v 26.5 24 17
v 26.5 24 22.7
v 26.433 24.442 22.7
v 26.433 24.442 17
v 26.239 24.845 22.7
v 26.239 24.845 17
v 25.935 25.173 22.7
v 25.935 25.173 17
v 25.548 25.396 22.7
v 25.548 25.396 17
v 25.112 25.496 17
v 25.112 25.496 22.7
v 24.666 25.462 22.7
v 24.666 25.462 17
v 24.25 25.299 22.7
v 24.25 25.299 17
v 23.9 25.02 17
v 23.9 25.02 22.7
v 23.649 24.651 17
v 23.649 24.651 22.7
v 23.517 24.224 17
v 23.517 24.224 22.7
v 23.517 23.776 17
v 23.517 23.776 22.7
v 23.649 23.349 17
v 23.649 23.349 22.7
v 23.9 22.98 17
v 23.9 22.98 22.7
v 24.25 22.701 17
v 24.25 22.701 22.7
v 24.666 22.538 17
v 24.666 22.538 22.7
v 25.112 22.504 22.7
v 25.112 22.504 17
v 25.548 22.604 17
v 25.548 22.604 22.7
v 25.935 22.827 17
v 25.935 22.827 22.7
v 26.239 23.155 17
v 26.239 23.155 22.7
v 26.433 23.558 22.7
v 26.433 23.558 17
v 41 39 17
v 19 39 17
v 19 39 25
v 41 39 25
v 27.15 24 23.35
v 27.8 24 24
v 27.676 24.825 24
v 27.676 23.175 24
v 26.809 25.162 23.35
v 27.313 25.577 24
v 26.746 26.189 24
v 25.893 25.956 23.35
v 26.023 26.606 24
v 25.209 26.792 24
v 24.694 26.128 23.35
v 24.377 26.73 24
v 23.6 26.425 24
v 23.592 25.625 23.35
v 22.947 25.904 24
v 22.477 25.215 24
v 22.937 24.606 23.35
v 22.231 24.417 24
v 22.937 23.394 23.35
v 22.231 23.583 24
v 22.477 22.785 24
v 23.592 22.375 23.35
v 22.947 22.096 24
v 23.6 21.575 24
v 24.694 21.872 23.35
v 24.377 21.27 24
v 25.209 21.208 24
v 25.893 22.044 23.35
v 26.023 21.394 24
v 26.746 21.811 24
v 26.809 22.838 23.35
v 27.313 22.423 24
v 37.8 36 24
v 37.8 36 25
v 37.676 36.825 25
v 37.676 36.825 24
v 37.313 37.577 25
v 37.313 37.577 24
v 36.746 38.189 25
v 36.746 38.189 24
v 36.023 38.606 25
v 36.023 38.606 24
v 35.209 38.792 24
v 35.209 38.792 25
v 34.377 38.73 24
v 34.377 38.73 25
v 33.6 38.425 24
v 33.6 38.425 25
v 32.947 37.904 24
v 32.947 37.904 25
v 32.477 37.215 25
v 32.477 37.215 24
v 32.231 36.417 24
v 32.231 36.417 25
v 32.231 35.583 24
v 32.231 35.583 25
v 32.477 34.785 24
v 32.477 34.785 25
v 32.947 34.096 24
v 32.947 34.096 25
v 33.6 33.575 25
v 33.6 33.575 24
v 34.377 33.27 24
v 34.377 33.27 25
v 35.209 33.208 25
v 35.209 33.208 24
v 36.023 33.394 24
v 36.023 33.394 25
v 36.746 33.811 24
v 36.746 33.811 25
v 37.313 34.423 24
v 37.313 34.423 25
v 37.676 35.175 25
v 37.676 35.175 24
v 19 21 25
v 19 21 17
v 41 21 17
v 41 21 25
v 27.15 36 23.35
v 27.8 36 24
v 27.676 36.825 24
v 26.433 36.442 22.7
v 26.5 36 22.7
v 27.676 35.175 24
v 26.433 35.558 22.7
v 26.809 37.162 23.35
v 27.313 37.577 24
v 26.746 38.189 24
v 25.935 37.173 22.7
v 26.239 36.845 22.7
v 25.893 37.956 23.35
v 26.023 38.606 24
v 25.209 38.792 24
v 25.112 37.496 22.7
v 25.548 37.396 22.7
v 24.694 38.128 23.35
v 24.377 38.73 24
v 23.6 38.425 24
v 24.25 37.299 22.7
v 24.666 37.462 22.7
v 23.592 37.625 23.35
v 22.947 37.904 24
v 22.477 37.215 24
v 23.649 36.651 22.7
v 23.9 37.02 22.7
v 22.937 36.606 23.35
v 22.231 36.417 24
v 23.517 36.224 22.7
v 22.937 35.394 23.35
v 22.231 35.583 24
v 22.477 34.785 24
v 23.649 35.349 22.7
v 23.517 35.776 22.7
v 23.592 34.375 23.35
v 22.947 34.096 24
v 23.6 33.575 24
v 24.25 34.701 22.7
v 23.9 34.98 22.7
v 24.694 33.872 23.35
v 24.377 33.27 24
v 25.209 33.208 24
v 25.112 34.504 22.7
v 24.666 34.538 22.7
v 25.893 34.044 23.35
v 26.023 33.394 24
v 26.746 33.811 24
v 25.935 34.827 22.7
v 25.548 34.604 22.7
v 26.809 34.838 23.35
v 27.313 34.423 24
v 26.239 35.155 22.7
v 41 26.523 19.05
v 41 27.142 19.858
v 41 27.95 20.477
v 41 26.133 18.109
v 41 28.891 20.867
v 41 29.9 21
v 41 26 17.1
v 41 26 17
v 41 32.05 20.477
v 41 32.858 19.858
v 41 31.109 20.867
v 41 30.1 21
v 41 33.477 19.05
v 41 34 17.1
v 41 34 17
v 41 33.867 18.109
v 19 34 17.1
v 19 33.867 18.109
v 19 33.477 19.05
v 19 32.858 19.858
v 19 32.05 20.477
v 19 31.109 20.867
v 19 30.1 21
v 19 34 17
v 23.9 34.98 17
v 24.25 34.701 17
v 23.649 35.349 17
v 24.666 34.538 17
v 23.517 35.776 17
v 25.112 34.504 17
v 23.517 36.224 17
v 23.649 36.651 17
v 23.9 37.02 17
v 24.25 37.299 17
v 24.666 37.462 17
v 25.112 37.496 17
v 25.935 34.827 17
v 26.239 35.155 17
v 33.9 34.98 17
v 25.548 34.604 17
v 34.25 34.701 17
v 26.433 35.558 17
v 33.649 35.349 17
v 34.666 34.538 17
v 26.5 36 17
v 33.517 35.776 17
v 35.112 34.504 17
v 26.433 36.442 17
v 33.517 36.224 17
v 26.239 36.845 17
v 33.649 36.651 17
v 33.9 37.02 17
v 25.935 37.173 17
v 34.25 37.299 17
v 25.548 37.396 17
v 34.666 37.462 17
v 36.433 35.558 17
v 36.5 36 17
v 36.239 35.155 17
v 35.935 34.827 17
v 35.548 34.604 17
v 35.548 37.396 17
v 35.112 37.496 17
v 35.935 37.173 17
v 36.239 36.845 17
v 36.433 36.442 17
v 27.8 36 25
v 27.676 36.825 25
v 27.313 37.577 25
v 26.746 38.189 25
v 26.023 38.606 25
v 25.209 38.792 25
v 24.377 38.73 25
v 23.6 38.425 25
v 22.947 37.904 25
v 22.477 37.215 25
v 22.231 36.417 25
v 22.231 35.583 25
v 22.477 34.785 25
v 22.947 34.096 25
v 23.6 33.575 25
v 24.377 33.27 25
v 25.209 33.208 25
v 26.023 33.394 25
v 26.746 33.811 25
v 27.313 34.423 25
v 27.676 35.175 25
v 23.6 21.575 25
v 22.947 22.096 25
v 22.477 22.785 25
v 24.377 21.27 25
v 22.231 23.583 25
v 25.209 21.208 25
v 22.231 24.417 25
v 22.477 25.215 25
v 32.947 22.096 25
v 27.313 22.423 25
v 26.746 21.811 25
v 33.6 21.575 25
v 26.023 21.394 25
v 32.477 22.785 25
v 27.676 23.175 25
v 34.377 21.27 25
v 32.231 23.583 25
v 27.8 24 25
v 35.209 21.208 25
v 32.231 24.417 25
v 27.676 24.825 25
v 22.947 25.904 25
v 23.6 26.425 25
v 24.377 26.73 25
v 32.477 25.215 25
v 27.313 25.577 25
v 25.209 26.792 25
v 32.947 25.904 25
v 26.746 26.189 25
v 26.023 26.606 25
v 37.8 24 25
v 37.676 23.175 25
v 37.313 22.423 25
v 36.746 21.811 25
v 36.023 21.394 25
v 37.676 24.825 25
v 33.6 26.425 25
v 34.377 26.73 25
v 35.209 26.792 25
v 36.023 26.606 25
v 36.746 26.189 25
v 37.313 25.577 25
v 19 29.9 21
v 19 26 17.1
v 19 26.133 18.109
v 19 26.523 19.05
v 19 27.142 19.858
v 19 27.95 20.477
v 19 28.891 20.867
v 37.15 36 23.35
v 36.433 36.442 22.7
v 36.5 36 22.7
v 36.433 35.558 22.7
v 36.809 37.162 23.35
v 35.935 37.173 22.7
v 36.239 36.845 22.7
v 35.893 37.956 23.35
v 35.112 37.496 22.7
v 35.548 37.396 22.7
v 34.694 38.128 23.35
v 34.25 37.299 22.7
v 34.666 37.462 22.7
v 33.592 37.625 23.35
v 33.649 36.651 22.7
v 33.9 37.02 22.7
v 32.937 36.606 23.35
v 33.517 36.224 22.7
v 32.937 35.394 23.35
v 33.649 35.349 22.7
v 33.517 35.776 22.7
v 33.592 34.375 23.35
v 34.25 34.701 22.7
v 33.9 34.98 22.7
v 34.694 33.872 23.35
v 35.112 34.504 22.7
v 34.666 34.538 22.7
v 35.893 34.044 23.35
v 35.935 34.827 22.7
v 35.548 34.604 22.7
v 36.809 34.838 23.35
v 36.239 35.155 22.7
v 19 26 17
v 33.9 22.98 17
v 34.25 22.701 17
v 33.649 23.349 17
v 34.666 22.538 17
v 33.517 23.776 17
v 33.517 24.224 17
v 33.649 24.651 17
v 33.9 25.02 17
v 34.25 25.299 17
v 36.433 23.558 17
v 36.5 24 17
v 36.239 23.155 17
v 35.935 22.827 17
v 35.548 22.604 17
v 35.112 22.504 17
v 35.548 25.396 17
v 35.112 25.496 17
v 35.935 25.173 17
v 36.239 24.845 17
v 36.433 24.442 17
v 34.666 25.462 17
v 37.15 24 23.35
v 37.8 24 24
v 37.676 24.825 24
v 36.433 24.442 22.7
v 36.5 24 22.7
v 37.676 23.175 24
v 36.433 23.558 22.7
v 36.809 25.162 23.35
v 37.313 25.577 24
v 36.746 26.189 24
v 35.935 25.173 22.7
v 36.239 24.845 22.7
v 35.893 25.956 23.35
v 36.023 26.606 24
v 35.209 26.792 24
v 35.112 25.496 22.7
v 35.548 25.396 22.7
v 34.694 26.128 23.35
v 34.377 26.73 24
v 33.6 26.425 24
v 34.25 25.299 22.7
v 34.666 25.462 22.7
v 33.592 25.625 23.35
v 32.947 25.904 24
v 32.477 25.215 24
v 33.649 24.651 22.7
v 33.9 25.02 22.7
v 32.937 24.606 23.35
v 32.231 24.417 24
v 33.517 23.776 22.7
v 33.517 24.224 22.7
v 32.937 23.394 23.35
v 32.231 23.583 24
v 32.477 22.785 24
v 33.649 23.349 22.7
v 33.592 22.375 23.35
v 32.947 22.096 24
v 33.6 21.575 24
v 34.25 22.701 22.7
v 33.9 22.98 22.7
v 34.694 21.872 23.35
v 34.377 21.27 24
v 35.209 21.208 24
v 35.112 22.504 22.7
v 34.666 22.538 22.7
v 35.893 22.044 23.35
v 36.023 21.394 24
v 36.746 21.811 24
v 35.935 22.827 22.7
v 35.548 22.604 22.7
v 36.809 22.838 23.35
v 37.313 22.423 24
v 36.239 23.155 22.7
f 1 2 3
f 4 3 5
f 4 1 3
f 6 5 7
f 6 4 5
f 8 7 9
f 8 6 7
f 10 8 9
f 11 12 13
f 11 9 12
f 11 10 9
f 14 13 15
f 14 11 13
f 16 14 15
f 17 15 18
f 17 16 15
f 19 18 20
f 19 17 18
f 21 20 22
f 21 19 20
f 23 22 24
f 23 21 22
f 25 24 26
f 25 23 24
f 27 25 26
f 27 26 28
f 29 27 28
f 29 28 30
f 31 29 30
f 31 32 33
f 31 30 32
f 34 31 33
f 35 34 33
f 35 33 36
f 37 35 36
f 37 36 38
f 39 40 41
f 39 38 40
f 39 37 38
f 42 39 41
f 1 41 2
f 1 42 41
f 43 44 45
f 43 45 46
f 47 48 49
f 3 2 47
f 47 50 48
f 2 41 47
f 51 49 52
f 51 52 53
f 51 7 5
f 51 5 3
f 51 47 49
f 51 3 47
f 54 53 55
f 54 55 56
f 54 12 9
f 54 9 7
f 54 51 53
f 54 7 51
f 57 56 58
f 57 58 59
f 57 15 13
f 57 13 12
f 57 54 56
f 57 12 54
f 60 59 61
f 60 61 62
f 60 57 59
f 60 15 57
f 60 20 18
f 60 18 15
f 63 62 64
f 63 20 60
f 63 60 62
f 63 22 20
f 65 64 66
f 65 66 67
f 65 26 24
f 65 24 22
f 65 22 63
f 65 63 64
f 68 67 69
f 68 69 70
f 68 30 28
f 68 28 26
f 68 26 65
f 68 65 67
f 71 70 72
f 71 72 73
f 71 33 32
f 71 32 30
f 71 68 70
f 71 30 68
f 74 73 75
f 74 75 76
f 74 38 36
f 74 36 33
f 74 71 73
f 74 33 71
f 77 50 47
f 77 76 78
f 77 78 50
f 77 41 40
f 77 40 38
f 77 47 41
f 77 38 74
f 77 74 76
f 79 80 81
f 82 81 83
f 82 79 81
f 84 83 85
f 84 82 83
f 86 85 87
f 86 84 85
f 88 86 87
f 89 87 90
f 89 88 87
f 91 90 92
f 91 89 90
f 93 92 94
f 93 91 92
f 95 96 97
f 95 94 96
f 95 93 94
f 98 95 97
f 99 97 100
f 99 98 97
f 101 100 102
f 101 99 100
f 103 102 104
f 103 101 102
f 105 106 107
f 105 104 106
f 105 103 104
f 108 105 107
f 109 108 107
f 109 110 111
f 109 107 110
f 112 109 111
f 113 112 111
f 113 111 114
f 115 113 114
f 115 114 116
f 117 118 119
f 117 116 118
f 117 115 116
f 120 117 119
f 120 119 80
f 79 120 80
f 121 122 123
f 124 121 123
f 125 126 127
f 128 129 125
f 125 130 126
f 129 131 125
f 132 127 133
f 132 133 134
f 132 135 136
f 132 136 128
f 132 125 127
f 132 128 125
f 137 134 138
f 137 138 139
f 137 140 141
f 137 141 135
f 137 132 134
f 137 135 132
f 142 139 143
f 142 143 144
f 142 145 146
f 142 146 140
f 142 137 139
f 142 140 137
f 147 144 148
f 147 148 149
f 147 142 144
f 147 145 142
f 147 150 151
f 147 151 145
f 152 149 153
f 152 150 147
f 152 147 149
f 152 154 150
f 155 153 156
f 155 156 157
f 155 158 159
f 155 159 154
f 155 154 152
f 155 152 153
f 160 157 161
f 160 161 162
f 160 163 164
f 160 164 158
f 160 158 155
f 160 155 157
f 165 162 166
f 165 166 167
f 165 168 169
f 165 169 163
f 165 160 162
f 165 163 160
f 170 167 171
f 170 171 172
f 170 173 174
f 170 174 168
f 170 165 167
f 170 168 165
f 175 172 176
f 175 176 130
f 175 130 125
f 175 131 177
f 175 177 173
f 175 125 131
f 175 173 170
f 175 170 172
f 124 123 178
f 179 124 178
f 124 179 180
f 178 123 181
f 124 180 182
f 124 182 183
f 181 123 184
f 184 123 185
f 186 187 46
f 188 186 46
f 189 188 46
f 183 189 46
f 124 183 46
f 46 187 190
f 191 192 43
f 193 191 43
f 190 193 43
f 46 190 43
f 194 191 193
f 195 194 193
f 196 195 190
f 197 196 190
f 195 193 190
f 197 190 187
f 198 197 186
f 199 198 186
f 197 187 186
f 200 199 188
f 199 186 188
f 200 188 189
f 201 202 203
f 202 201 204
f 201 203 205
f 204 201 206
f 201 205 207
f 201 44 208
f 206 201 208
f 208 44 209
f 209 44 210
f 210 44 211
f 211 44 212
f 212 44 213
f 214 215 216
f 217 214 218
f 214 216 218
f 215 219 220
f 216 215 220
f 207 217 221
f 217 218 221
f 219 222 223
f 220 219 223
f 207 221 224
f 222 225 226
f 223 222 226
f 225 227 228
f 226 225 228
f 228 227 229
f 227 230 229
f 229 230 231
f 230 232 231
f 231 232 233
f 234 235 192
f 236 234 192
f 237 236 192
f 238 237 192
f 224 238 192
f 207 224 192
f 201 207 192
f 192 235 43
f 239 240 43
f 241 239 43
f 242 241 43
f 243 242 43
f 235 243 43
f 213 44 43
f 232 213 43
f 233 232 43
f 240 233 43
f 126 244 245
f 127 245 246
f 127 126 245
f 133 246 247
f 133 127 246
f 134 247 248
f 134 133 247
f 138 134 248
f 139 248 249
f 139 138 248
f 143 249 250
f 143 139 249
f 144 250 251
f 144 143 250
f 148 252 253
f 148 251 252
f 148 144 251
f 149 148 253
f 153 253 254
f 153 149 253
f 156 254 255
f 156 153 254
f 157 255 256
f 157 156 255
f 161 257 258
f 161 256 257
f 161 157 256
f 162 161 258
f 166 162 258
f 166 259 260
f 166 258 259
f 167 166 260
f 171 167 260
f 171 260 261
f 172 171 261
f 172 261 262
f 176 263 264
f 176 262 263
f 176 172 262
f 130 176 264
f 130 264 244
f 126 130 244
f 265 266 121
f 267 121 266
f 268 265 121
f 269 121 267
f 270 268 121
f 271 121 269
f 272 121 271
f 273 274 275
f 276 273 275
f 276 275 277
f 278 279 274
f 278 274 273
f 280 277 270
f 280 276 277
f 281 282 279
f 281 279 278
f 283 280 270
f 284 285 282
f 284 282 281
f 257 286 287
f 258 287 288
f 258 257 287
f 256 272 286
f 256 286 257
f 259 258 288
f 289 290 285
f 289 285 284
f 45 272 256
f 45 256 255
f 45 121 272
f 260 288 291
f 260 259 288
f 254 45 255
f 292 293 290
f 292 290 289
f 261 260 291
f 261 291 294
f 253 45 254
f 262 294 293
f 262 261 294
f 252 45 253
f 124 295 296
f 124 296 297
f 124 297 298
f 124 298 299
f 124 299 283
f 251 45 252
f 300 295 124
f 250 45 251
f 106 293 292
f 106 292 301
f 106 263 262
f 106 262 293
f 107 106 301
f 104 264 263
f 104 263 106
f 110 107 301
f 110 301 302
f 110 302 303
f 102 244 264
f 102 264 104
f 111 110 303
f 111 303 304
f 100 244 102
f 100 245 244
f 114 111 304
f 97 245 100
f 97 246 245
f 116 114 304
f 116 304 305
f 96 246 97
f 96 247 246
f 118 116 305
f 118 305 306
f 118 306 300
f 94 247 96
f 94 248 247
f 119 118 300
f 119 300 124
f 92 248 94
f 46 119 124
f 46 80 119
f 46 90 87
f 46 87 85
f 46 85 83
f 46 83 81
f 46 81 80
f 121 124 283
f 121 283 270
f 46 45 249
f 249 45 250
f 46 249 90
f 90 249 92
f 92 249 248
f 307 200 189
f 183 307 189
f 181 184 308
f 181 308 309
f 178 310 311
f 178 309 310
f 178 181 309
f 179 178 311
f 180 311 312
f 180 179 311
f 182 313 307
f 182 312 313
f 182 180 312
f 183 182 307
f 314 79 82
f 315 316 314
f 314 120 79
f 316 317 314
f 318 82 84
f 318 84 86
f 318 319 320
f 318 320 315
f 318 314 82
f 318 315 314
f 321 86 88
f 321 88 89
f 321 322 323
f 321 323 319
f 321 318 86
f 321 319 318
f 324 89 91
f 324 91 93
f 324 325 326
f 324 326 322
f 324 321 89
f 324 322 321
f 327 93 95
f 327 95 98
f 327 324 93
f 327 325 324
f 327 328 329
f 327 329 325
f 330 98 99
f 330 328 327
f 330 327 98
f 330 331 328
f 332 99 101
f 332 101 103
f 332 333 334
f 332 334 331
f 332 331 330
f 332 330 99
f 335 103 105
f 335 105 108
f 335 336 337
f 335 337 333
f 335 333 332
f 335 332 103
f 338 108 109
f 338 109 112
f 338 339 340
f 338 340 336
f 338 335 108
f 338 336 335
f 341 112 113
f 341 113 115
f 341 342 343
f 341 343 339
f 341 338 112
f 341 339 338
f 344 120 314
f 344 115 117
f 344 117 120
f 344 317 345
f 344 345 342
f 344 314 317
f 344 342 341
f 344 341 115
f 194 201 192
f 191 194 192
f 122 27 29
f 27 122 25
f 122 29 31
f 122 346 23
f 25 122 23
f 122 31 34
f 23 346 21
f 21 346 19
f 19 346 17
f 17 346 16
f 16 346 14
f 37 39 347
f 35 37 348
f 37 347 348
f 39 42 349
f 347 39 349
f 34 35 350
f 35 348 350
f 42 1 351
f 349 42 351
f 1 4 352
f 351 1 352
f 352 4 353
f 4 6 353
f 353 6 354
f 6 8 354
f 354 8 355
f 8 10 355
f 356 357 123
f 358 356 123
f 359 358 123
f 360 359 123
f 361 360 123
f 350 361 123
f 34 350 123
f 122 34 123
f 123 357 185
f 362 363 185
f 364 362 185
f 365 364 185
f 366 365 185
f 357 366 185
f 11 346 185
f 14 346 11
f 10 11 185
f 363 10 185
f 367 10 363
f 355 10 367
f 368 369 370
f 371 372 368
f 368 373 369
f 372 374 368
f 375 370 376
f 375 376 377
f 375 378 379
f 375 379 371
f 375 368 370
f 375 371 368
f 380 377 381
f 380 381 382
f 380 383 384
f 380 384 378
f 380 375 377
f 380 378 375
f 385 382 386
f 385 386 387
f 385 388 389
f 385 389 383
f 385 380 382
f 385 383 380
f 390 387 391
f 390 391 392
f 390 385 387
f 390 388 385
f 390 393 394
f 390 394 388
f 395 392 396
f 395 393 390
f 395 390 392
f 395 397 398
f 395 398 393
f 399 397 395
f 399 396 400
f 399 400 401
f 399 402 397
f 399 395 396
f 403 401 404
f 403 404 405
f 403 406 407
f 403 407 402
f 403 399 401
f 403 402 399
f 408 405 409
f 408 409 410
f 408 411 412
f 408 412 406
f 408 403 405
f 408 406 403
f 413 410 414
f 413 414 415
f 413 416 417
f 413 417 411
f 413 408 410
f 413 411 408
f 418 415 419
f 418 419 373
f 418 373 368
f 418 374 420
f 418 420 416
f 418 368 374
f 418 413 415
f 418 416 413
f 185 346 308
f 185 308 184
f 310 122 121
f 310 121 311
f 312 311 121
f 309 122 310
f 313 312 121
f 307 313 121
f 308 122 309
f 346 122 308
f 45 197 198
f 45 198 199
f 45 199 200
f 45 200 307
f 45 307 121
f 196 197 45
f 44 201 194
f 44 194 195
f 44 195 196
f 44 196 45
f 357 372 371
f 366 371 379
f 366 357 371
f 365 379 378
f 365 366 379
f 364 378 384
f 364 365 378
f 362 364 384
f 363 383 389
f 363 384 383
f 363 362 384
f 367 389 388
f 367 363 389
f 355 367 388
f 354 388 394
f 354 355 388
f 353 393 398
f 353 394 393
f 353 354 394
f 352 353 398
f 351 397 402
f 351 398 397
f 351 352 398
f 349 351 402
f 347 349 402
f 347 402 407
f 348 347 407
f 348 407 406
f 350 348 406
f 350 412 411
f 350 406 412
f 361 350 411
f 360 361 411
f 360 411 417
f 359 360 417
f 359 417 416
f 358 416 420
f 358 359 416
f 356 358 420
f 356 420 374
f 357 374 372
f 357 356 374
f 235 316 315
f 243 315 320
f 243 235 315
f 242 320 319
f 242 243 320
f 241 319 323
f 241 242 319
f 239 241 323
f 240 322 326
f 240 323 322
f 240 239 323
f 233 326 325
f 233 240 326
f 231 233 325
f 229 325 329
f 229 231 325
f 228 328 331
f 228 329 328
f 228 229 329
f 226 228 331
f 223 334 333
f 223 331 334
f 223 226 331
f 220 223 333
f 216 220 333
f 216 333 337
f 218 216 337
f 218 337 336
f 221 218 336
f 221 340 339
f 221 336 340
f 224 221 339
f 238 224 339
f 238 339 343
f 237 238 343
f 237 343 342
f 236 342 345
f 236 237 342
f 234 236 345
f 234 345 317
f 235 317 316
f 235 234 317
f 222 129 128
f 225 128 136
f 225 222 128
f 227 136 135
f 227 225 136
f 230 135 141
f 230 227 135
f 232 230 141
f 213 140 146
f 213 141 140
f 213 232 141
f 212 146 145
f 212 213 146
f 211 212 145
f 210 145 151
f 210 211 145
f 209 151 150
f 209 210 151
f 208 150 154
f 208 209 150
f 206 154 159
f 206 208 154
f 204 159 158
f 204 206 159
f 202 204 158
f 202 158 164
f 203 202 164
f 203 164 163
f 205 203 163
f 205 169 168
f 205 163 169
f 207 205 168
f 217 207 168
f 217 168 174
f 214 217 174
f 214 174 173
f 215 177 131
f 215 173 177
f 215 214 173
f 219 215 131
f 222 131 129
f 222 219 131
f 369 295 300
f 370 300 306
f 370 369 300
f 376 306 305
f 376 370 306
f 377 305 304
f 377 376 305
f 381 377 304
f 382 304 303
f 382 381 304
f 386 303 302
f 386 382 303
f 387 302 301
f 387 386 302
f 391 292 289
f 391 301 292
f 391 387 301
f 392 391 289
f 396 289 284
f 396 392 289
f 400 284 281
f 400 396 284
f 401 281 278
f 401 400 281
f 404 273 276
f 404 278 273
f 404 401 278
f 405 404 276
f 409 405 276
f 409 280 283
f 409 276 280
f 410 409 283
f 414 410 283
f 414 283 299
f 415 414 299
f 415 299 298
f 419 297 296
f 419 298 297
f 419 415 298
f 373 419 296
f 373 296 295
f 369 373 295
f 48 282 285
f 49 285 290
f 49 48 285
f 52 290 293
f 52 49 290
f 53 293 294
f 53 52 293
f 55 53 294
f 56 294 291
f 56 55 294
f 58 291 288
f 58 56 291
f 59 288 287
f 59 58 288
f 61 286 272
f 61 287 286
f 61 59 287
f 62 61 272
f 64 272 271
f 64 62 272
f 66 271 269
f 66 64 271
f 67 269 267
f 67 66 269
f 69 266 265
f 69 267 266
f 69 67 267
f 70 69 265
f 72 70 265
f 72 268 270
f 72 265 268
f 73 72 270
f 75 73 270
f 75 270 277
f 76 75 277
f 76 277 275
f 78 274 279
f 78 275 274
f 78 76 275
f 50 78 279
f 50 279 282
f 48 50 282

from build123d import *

# Parameters (mm, degrees)
CYLINDER018_R     = 1.5
CYLINDER018_DEPTH = 25
CYLINDER020_R     = 2.8
CYLINDER020_DEPTH = 5
CHAMFER001_SIZE   = 2
CYLINDER016_R     = 1.5
CYLINDER016_DEPTH = 25
CYLINDER017_R     = 1.5
CYLINDER017_DEPTH = 25
CYLINDER021_R     = 2.8
CYLINDER021_DEPTH = 5
CHAMFER002_SIZE   = 2
CYLINDER015_R     = 1.5
CYLINDER015_DEPTH = 25
CYLINDER019_R     = 2.8
CYLINDER019_DEPTH = 5
CHAMFER003_SIZE   = 2
BOX018_W          = 40
BOX018_H          = 8
BOX018_DEPTH      = 5
FILLET014_R       = 3.9
CYLINDER022_R     = 2.8
CYLINDER022_DEPTH = 5
CHAMFER_SIZE      = 2
BOX017_W          = 22
BOX017_H          = 18
BOX017_DEPTH      = 8


with BuildPart() as screholle017:
    # Cylinder018 → Cylinder018 (new body)
    with BuildSketch(Plane(origin=(25, 24, 2), x_dir=(1, 0, 0), z_dir=(0, 0, 1))):
        Circle(CYLINDER018_R)
    extrude(amount=CYLINDER018_DEPTH)


with BuildPart() as chamfer001:
    # Cylinder020 → Cylinder020 (new body)
    with BuildSketch(Plane(origin=(25, 36, 18), x_dir=(1, 0, 0), z_dir=(0, 0, 1))):
        Circle(CYLINDER020_R)
    extrude(amount=CYLINDER020_DEPTH)

    # Chamfer001
    chamfer001_edges = [chamfer001.edges().sort_by_distance(p)[0] for p in [
        (22.2, 36, 18),
    ]]
    chamfer(chamfer001_edges, length=CHAMFER001_SIZE)


with BuildPart() as screholle015:
    # Cylinder016 → Cylinder016 (new body)
    with BuildSketch(Plane(origin=(25, 36, 2), x_dir=(1, 0, 0), z_dir=(0, 0, 1))):
        Circle(CYLINDER016_R)
    extrude(amount=CYLINDER016_DEPTH)


with BuildPart() as screholle016:
    # Cylinder017 → Cylinder017 (new body)
    with BuildSketch(Plane(origin=(35, 36, 2), x_dir=(1, 0, 0), z_dir=(0, 0, 1))):
        Circle(CYLINDER017_R)
    extrude(amount=CYLINDER017_DEPTH)


with BuildPart() as chamfer002:
    # Cylinder021 → Cylinder021 (new body)
    with BuildSketch(Plane(origin=(35, 36, 18), x_dir=(1, 0, 0), z_dir=(0, 0, 1))):
        Circle(CYLINDER021_R)
    extrude(amount=CYLINDER021_DEPTH)

    # Chamfer002
    chamfer002_edges = [chamfer002.edges().sort_by_distance(p)[0] for p in [
        (32.2, 36, 18),
    ]]
    chamfer(chamfer002_edges, length=CHAMFER002_SIZE)


with BuildPart() as screholle014:
    # Cylinder015 → Cylinder015 (new body)
    with BuildSketch(Plane(origin=(35, 24, 2), x_dir=(1, 0, 0), z_dir=(0, 0, 1))):
        Circle(CYLINDER015_R)
    extrude(amount=CYLINDER015_DEPTH)


with BuildPart() as chamfer003:
    # Cylinder019 → Cylinder019 (new body)
    with BuildSketch(Plane(origin=(35, 24, 18), x_dir=(1, 0, 0), z_dir=(0, 0, 1))):
        Circle(CYLINDER019_R)
    extrude(amount=CYLINDER019_DEPTH)

    # Chamfer003
    chamfer003_edges = [chamfer003.edges().sort_by_distance(p)[0] for p in [
        (32.2, 24, 18),
    ]]
    chamfer(chamfer003_edges, length=CHAMFER003_SIZE)


with BuildPart() as fillet014:
    # Box018 → Box018 (new body)
    with BuildSketch(Plane(origin=(10, 26, 12), x_dir=(1, 0, 0), z_dir=(0, 0, 1))):
        with Locations((20, 4)):
            Rectangle(BOX018_W, BOX018_H)
    extrude(amount=BOX018_DEPTH)

    # Fillet014
    fillet014_edges = [fillet014.edges().sort_by_distance(p)[0] for p in [
        (30, 26, 17),
        (30, 34, 17),
    ]]
    fillet(fillet014_edges, radius=FILLET014_R)


with BuildPart() as fusion005007:
    # Cylinder022 → Cylinder022 (new body)
    with BuildSketch(Plane(origin=(25, 24, 18), x_dir=(1, 0, 0), z_dir=(0, 0, 1))):
        Circle(CYLINDER022_R)
    extrude(amount=CYLINDER022_DEPTH)

    # Chamfer
    chamfer_edges = [fusion005007.edges().sort_by_distance(p)[0] for p in [
        (22.2, 24, 18),
    ]]
    chamfer(chamfer_edges, length=CHAMFER_SIZE)

    # Fusion005007: union ScreHolle017, Chamfer001, ScreHolle015, ScreHolle016, Chamfer002, ScreHolle014, Chamfer003, Fillet014
    add(screholle017.part)
    add(chamfer001.part)
    add(screholle015.part)
    add(screholle016.part)
    add(chamfer002.part)
    add(screholle014.part)
    add(chamfer003.part)
    add(fillet014.part)


with BuildPart() as cablecap:
    # Box017 → Box017 (new body)
    with BuildSketch(Plane(origin=(19, 21, 13), x_dir=(1, 0, 0), z_dir=(0, 0, 1))):
        with Locations((11, 9)):
            Rectangle(BOX017_W, BOX017_H)
    extrude(amount=BOX017_DEPTH)

    # Cut004: cut Fusion005007
    add(fusion005007.part, mode=Mode.SUBTRACT)


with BuildPart() as cablecap_1:
    # Cut004 placement: moved
    add(cablecap.part.moved(Location((0, 0, 4))))


solid = cablecap_1.part
